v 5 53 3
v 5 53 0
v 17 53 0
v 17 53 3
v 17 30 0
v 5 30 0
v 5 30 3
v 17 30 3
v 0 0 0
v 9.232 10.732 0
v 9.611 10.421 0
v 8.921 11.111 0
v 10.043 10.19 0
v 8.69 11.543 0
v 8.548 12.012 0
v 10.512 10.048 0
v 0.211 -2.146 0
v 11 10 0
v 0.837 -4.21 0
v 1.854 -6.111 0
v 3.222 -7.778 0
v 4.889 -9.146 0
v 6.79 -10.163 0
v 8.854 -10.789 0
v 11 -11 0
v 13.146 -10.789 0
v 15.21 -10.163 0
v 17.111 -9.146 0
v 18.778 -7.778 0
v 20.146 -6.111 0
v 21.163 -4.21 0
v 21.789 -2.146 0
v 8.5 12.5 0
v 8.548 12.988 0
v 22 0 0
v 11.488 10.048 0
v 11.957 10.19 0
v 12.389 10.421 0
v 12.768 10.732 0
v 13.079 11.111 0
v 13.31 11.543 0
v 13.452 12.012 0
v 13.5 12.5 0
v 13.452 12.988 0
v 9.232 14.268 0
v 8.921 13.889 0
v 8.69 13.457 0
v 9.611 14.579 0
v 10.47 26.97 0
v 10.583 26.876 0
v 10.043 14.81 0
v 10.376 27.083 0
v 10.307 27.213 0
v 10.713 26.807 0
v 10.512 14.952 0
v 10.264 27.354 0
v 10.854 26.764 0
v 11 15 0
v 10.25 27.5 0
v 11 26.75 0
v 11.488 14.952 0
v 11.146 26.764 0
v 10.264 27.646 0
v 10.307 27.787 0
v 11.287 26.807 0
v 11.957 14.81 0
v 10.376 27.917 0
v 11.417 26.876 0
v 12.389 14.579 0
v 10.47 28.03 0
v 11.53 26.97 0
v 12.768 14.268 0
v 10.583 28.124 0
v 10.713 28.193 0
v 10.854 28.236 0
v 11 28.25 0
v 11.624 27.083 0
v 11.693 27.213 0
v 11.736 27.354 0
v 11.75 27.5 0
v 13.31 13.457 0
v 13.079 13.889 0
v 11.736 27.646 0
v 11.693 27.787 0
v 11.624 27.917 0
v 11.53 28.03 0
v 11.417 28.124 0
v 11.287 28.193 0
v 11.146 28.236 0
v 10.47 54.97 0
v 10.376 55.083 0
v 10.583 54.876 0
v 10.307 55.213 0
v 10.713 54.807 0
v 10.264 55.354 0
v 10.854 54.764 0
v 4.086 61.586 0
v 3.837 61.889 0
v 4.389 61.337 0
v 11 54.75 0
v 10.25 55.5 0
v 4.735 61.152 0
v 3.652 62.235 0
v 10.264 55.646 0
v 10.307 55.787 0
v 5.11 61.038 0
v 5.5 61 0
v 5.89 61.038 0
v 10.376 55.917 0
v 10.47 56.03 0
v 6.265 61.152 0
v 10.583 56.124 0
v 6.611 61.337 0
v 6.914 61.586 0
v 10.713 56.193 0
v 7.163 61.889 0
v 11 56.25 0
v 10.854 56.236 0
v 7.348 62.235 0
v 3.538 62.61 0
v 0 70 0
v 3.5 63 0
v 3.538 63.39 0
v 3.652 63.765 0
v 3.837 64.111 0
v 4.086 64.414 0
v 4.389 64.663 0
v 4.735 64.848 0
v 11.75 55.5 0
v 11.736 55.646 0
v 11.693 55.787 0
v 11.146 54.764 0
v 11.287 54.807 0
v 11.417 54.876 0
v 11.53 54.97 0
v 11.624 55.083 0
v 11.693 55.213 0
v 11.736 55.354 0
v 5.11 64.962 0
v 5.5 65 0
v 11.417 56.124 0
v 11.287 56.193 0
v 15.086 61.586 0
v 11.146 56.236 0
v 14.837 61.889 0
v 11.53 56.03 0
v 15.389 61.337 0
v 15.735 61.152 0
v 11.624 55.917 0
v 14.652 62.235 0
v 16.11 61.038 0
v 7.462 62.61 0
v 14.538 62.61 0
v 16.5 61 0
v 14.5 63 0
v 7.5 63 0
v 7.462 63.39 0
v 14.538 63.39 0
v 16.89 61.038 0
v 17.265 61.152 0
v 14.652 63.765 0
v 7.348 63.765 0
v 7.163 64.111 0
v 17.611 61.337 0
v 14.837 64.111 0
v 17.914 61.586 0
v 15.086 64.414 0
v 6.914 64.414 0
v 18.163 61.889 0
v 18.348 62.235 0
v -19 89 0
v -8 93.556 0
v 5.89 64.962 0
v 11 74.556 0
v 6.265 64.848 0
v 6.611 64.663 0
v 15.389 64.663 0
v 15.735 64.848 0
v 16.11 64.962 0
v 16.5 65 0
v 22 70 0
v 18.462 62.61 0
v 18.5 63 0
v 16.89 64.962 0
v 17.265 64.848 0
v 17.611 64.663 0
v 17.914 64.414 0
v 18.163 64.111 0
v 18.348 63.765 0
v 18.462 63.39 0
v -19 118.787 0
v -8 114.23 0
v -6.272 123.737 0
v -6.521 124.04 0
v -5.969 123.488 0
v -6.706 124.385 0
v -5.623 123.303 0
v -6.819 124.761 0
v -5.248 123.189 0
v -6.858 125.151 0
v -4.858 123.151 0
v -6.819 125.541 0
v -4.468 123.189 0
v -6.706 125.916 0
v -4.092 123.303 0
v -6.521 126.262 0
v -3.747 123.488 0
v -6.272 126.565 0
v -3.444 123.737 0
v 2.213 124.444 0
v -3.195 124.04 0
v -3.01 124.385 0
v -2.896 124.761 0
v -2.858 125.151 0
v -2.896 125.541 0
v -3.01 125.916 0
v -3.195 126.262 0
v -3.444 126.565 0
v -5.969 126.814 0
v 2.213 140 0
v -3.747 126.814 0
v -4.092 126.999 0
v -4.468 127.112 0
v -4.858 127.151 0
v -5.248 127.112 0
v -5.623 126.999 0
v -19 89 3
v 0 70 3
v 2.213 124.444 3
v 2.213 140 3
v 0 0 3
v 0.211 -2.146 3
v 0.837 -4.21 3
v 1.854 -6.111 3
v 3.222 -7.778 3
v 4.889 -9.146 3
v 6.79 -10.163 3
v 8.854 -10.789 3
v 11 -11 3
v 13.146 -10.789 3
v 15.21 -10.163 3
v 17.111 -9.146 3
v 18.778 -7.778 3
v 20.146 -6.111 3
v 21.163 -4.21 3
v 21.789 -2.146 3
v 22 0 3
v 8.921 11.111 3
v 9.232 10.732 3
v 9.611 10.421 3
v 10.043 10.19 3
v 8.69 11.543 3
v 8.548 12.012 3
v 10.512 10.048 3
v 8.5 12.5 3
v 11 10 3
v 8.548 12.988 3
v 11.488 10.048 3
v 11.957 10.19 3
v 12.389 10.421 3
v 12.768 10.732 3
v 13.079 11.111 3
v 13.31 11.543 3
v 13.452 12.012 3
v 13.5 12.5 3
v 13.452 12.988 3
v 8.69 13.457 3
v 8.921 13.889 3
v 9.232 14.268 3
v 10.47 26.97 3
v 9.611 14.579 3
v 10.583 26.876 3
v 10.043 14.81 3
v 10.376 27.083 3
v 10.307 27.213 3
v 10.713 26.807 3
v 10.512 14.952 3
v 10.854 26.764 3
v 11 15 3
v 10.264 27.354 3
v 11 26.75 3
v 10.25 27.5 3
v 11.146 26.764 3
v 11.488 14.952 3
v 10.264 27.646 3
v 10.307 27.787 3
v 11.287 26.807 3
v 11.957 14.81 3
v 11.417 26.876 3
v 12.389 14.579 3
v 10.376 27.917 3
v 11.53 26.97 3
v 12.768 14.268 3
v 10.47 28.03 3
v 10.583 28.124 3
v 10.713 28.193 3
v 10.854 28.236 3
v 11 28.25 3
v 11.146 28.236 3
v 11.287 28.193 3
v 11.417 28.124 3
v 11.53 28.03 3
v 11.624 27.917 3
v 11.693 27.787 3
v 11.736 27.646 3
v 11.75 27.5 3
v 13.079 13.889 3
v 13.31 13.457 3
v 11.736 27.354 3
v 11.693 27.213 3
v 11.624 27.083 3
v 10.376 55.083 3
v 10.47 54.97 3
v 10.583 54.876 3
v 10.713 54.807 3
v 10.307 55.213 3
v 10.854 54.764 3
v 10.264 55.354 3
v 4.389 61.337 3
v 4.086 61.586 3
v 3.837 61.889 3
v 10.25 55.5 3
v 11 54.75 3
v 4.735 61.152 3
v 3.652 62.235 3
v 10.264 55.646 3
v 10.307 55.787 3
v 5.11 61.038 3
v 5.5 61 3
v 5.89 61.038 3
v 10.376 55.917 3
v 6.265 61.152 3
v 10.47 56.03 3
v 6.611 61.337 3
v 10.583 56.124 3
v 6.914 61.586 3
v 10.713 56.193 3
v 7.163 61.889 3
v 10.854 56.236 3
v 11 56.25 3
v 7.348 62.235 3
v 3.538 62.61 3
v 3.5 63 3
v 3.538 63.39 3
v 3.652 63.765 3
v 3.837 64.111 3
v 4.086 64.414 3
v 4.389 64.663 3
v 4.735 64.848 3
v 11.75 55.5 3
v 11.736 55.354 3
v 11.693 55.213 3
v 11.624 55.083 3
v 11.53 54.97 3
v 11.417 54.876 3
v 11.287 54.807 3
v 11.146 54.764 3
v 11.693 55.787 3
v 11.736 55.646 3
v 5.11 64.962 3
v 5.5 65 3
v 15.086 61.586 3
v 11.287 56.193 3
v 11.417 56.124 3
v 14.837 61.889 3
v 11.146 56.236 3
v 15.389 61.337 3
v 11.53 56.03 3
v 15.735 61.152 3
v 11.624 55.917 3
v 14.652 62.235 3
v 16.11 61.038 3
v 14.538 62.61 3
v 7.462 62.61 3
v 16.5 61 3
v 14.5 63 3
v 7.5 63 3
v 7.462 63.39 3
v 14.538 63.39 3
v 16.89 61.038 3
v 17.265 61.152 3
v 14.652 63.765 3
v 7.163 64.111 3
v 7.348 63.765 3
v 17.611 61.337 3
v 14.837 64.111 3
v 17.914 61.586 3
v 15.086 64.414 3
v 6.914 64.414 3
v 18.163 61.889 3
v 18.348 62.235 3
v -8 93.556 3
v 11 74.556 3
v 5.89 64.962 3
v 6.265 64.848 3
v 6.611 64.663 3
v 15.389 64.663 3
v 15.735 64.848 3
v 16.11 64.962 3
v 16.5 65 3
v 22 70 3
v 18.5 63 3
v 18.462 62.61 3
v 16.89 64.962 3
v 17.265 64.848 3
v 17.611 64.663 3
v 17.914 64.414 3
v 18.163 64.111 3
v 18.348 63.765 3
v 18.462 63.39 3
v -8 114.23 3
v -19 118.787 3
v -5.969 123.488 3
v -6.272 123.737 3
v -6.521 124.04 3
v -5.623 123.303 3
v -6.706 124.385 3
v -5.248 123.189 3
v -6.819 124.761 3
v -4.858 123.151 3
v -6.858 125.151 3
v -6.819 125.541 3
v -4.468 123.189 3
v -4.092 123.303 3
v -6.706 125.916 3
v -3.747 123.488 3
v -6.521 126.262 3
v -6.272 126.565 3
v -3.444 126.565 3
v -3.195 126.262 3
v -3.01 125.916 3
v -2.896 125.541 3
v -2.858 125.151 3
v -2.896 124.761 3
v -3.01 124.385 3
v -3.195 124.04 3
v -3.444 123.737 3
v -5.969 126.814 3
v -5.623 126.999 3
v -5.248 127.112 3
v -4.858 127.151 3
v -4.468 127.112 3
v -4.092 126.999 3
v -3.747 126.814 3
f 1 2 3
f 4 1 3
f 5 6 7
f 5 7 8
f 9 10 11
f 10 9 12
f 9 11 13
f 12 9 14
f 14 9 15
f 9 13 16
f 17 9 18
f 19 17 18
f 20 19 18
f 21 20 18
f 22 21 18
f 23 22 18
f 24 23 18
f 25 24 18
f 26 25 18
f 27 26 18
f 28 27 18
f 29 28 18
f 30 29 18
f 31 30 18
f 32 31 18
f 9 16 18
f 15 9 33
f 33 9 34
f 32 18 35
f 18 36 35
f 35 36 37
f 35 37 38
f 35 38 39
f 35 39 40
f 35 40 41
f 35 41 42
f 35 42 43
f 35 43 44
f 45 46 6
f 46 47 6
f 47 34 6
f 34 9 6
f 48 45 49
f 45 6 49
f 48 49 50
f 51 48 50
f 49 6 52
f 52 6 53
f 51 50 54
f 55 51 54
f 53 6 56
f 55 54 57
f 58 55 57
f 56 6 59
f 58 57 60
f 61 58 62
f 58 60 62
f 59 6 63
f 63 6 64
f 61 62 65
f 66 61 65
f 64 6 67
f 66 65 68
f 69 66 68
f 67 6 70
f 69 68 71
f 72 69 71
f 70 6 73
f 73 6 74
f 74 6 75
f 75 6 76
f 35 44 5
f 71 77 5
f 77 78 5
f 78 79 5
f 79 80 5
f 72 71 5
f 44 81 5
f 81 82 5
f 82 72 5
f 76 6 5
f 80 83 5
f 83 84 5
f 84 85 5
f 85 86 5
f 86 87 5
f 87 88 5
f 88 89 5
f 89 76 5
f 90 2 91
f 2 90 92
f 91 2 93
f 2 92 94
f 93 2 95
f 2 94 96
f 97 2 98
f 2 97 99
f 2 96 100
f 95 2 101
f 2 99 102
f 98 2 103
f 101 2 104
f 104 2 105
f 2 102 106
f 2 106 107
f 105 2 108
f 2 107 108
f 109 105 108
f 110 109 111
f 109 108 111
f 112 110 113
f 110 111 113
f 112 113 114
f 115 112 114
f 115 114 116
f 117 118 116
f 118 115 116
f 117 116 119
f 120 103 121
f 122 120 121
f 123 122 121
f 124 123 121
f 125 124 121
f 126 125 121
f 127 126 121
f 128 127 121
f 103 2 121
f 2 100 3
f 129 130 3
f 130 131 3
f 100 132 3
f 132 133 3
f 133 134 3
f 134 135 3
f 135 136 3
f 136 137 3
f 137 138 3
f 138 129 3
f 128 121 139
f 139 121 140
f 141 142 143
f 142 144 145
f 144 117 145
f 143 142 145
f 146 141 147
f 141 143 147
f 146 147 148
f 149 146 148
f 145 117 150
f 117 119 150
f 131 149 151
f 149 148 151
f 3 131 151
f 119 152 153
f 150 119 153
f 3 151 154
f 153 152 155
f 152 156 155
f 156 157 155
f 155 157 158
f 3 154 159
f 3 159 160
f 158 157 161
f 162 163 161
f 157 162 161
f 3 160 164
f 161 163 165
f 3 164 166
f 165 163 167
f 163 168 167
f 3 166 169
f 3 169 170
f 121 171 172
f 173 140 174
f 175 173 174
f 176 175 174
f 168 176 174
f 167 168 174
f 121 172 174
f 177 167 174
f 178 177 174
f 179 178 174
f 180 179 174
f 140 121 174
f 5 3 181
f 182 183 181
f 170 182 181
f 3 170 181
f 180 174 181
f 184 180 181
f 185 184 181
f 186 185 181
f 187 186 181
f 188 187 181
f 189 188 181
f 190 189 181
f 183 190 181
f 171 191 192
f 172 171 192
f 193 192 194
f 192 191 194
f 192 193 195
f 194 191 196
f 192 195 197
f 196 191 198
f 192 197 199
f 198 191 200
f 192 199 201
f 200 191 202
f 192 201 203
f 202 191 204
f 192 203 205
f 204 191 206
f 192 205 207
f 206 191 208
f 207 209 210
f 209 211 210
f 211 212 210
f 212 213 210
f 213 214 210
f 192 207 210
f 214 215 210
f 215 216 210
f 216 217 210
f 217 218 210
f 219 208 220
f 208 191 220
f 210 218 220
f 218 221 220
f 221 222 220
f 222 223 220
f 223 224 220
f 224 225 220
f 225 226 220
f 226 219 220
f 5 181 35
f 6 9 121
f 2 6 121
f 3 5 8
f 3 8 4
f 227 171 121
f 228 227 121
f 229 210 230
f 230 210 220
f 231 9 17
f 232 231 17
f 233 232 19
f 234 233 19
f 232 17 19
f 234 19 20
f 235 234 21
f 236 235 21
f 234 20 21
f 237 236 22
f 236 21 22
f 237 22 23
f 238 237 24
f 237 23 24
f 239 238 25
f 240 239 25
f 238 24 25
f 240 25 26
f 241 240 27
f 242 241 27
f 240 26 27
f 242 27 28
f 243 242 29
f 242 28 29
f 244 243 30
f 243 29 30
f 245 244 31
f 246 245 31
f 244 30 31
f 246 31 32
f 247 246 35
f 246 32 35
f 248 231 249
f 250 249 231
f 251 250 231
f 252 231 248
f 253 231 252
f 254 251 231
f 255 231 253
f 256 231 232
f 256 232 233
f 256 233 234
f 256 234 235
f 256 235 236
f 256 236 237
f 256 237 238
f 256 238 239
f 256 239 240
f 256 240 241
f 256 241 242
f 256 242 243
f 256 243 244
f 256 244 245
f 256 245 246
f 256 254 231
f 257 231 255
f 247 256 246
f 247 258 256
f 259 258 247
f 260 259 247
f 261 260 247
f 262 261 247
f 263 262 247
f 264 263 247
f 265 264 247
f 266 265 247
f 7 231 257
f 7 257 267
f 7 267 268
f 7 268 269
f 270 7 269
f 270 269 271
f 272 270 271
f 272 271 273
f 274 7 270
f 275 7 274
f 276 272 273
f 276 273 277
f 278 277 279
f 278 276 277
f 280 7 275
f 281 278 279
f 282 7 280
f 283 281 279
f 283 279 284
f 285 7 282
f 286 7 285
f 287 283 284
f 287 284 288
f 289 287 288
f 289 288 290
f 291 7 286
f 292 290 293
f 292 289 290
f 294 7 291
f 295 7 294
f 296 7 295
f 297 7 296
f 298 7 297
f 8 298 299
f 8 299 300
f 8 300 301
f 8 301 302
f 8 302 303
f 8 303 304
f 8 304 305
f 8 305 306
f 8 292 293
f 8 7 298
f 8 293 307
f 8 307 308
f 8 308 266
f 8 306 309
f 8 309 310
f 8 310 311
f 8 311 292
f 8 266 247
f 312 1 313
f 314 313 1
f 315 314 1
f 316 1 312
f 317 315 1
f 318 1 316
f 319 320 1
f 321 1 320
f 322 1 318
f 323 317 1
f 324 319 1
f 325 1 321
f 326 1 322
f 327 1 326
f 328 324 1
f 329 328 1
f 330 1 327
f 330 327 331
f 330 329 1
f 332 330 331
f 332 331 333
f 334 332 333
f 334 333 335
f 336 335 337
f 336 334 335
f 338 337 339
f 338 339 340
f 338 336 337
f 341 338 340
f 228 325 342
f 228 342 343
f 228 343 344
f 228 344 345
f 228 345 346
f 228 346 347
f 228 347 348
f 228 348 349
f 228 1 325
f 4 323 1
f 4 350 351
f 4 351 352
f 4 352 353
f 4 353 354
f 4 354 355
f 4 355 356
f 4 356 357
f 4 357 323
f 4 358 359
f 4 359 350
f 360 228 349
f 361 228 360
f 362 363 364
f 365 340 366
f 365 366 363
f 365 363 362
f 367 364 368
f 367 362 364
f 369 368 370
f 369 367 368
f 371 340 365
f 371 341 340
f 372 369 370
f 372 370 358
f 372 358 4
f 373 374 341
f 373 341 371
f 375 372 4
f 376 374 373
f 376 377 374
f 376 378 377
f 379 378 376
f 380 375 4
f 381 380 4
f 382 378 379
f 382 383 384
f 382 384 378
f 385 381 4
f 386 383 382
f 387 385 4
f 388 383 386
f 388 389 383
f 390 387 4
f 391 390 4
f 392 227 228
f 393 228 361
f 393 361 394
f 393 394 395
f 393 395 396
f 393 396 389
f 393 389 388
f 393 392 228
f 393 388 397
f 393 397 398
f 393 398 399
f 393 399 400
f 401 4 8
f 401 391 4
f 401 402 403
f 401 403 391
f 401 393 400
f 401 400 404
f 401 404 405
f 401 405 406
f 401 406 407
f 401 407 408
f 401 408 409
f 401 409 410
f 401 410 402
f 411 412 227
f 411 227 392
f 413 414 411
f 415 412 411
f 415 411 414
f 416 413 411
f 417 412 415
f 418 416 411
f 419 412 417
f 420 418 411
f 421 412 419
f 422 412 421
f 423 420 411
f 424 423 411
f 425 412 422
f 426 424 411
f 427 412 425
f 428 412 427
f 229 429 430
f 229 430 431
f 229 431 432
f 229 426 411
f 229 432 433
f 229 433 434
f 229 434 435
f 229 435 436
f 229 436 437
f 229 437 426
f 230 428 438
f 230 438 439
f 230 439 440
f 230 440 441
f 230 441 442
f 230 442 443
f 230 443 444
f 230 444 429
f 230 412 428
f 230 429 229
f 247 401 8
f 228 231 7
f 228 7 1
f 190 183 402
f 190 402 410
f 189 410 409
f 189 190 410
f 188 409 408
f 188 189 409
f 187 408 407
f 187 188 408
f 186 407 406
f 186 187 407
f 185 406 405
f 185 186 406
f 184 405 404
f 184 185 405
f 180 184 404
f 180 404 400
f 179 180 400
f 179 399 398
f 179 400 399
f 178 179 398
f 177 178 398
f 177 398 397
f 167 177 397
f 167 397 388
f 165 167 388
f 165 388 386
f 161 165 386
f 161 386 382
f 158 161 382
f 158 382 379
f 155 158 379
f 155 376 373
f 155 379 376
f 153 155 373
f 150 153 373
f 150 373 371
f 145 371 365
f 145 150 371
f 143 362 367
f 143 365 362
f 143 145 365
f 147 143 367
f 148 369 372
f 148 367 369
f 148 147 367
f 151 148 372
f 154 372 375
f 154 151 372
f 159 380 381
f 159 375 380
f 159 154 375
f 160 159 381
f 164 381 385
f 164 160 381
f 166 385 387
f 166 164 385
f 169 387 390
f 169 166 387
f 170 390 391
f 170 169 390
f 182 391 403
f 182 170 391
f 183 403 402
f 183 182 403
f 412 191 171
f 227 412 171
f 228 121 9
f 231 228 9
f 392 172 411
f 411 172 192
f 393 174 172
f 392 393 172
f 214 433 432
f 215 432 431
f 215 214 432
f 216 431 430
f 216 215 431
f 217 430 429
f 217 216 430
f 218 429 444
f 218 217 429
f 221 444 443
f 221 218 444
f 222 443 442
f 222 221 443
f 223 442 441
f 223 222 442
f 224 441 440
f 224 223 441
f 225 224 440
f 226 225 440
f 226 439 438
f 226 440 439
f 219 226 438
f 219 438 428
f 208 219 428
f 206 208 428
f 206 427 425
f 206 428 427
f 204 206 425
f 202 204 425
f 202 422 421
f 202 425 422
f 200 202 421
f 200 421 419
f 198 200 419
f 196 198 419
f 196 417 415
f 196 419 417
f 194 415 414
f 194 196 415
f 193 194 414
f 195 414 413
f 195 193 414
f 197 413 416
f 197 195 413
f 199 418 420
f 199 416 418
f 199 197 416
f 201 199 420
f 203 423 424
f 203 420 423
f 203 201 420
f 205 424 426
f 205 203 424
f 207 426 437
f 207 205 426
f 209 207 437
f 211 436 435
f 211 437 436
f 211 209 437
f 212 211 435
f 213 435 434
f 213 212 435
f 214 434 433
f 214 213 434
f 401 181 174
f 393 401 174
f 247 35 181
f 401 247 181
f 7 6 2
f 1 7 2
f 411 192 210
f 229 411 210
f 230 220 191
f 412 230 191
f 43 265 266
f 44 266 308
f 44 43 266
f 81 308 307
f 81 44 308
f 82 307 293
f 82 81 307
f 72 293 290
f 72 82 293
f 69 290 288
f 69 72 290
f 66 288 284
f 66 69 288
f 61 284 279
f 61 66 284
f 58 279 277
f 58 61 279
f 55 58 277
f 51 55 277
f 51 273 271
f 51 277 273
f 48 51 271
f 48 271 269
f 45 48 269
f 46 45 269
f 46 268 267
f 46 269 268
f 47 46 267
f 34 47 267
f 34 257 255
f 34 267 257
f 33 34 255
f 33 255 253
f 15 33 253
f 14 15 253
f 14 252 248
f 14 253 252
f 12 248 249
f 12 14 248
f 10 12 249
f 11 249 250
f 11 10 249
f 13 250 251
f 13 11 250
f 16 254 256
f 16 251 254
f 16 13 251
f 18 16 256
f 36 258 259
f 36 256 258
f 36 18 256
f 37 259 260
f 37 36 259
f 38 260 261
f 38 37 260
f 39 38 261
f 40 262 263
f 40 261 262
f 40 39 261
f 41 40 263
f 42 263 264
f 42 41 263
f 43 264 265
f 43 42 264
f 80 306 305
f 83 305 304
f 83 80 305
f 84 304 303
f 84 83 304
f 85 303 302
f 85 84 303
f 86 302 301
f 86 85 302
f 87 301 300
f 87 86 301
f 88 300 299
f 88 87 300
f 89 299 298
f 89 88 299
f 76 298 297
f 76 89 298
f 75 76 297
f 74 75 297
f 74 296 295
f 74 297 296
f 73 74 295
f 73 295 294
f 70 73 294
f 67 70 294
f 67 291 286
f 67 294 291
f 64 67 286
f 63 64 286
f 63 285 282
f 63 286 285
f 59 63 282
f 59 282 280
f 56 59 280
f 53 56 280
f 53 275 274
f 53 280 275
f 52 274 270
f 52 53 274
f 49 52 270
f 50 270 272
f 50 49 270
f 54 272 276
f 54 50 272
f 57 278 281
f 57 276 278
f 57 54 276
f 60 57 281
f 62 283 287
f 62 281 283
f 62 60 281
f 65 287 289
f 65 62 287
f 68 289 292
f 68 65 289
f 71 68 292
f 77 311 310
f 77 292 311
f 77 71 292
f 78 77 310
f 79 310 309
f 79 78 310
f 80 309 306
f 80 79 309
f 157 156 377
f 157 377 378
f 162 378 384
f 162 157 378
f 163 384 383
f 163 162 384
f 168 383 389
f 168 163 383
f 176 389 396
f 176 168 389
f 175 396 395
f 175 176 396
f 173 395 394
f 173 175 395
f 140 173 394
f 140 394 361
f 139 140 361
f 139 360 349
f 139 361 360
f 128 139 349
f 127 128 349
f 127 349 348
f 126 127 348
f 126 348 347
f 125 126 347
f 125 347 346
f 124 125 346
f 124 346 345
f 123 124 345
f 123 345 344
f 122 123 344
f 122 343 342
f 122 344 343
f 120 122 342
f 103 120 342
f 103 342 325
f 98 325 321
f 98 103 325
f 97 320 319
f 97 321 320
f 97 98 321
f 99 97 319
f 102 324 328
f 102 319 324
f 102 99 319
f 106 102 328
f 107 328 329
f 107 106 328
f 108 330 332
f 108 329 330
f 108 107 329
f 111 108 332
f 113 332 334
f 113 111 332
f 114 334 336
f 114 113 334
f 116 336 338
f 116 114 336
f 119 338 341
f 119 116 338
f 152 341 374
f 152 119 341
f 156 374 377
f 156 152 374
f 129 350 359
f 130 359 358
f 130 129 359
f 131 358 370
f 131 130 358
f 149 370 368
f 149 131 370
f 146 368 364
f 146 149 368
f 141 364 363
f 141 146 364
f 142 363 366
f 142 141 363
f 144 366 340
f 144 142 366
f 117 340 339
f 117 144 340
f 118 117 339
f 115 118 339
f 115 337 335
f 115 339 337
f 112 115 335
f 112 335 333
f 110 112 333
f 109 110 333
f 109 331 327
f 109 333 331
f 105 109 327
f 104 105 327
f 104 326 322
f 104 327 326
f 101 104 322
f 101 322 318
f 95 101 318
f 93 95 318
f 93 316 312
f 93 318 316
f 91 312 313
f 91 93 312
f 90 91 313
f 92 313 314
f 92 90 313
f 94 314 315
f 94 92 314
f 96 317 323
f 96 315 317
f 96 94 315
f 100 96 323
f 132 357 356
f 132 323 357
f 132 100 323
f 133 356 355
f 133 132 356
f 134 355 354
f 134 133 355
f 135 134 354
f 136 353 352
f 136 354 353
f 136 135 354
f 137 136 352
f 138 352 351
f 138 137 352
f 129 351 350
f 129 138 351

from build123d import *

# Parameters (mm, degrees)
SALIENTE_EXTRUIR1_DEPTH    = 3
CORTAR_EXTRUIR1_DEPTH      = 142.749779541
CORTAR_EXTRUIR1_DEPTH_BACK = 11
CROQUIS1_4_R               = 2
CROQUIS1_5_R               = 2
CORTAR_EXTRUIR3_DEPTH      = 142.749779541
CROQUIS1_6_W               = 12
CROQUIS1_6_H               = 23
TAMA_O_DEL_SERVO_DEPTH     = 142.749779541
CROQUIS1_7_R               = 0.75
CORTAR_EXTRUIR4_DEPTH      = 142.749779541
CROQUIS1_8_R               = 0.75
CORTAR_EXTRUIR5_DEPTH      = 142.749779541
CROQUIS1_11_R              = 2.5
CORTAR_EXTRUIR8_DEPTH      = 142.749779541


with BuildPart() as part:
    # Croquis1 → Saliente-Extruir1 (new body)
    with BuildSketch(Plane.XY):
        with BuildLine():
            Line((22, 0), (22, 70))
            Line((22, 70), (11, 74.556349186))
            Line((11, 74.556349186), (-8, 93.556349186))
            Line((-8, 93.556349186), (-8, 114.230447378))
            Line((-8, 114.230447378), (2.213203436, 124.443650814))
            Line((2.213203436, 124.443650814), (2.213203436, 140))
            Line((2.213203436, 140), (-19, 118.786796564))
            Line((-19, 118.786796564), (-19, 89))
            Line((-19, 89), (0, 70))
            Line((0, 70), (0, 0))
            ThreePointArc((0, 0), (11, -11), (22, 0))
        make_face()
    extrude(amount=SALIENTE_EXTRUIR1_DEPTH)

    # Croquis1<4> → Cortar-Extruir1 (cut, two sides: drawn at the far end of the back side and taken through both)
    with BuildSketch(Plane.XY.offset(-CORTAR_EXTRUIR1_DEPTH_BACK)):
        with Locations((5.5, 63)):
            Circle(CROQUIS1_4_R)
        with Locations((16.5, 63)):
            Circle(CROQUIS1_4_R)
    extrude(amount=CORTAR_EXTRUIR1_DEPTH + CORTAR_EXTRUIR1_DEPTH_BACK, mode=Mode.SUBTRACT)

    # Croquis1<5> → Cortar-Extruir3 (cut, through all)
    with BuildSketch(Plane.XY):
        with Locations((-4.857864376, 125.150757595)):
            Circle(CROQUIS1_5_R)
    extrude(amount=CORTAR_EXTRUIR3_DEPTH, mode=Mode.SUBTRACT)

    # Croquis1<6> → TAMAÑO DEL SERVO (cut, through all)
    with BuildSketch(Plane.XY):
        with Locations((11, 41.5)):
            Rectangle(CROQUIS1_6_W, CROQUIS1_6_H)
    extrude(amount=TAMA_O_DEL_SERVO_DEPTH, mode=Mode.SUBTRACT)

    # Croquis1<7> → Cortar-Extruir4 (cut, through all)
    with BuildSketch(Plane.XY):
        with Locations((11, 55.5)):
            Circle(CROQUIS1_7_R)
    extrude(amount=CORTAR_EXTRUIR4_DEPTH, mode=Mode.SUBTRACT)

    # Croquis1<8> → Cortar-Extruir5 (cut, through all)
    with BuildSketch(Plane.XY):
        with Locations((11, 27.5)):
            Circle(CROQUIS1_8_R)
    extrude(amount=CORTAR_EXTRUIR5_DEPTH, mode=Mode.SUBTRACT)

    # Croquis1<11> → Cortar-Extruir8 (cut, through all)
    with BuildSketch(Plane.XY):
        with Locations((11, 12.5)):
            Circle(CROQUIS1_11_R)
    extrude(amount=CORTAR_EXTRUIR8_DEPTH, mode=Mode.SUBTRACT)


solid = part.part
